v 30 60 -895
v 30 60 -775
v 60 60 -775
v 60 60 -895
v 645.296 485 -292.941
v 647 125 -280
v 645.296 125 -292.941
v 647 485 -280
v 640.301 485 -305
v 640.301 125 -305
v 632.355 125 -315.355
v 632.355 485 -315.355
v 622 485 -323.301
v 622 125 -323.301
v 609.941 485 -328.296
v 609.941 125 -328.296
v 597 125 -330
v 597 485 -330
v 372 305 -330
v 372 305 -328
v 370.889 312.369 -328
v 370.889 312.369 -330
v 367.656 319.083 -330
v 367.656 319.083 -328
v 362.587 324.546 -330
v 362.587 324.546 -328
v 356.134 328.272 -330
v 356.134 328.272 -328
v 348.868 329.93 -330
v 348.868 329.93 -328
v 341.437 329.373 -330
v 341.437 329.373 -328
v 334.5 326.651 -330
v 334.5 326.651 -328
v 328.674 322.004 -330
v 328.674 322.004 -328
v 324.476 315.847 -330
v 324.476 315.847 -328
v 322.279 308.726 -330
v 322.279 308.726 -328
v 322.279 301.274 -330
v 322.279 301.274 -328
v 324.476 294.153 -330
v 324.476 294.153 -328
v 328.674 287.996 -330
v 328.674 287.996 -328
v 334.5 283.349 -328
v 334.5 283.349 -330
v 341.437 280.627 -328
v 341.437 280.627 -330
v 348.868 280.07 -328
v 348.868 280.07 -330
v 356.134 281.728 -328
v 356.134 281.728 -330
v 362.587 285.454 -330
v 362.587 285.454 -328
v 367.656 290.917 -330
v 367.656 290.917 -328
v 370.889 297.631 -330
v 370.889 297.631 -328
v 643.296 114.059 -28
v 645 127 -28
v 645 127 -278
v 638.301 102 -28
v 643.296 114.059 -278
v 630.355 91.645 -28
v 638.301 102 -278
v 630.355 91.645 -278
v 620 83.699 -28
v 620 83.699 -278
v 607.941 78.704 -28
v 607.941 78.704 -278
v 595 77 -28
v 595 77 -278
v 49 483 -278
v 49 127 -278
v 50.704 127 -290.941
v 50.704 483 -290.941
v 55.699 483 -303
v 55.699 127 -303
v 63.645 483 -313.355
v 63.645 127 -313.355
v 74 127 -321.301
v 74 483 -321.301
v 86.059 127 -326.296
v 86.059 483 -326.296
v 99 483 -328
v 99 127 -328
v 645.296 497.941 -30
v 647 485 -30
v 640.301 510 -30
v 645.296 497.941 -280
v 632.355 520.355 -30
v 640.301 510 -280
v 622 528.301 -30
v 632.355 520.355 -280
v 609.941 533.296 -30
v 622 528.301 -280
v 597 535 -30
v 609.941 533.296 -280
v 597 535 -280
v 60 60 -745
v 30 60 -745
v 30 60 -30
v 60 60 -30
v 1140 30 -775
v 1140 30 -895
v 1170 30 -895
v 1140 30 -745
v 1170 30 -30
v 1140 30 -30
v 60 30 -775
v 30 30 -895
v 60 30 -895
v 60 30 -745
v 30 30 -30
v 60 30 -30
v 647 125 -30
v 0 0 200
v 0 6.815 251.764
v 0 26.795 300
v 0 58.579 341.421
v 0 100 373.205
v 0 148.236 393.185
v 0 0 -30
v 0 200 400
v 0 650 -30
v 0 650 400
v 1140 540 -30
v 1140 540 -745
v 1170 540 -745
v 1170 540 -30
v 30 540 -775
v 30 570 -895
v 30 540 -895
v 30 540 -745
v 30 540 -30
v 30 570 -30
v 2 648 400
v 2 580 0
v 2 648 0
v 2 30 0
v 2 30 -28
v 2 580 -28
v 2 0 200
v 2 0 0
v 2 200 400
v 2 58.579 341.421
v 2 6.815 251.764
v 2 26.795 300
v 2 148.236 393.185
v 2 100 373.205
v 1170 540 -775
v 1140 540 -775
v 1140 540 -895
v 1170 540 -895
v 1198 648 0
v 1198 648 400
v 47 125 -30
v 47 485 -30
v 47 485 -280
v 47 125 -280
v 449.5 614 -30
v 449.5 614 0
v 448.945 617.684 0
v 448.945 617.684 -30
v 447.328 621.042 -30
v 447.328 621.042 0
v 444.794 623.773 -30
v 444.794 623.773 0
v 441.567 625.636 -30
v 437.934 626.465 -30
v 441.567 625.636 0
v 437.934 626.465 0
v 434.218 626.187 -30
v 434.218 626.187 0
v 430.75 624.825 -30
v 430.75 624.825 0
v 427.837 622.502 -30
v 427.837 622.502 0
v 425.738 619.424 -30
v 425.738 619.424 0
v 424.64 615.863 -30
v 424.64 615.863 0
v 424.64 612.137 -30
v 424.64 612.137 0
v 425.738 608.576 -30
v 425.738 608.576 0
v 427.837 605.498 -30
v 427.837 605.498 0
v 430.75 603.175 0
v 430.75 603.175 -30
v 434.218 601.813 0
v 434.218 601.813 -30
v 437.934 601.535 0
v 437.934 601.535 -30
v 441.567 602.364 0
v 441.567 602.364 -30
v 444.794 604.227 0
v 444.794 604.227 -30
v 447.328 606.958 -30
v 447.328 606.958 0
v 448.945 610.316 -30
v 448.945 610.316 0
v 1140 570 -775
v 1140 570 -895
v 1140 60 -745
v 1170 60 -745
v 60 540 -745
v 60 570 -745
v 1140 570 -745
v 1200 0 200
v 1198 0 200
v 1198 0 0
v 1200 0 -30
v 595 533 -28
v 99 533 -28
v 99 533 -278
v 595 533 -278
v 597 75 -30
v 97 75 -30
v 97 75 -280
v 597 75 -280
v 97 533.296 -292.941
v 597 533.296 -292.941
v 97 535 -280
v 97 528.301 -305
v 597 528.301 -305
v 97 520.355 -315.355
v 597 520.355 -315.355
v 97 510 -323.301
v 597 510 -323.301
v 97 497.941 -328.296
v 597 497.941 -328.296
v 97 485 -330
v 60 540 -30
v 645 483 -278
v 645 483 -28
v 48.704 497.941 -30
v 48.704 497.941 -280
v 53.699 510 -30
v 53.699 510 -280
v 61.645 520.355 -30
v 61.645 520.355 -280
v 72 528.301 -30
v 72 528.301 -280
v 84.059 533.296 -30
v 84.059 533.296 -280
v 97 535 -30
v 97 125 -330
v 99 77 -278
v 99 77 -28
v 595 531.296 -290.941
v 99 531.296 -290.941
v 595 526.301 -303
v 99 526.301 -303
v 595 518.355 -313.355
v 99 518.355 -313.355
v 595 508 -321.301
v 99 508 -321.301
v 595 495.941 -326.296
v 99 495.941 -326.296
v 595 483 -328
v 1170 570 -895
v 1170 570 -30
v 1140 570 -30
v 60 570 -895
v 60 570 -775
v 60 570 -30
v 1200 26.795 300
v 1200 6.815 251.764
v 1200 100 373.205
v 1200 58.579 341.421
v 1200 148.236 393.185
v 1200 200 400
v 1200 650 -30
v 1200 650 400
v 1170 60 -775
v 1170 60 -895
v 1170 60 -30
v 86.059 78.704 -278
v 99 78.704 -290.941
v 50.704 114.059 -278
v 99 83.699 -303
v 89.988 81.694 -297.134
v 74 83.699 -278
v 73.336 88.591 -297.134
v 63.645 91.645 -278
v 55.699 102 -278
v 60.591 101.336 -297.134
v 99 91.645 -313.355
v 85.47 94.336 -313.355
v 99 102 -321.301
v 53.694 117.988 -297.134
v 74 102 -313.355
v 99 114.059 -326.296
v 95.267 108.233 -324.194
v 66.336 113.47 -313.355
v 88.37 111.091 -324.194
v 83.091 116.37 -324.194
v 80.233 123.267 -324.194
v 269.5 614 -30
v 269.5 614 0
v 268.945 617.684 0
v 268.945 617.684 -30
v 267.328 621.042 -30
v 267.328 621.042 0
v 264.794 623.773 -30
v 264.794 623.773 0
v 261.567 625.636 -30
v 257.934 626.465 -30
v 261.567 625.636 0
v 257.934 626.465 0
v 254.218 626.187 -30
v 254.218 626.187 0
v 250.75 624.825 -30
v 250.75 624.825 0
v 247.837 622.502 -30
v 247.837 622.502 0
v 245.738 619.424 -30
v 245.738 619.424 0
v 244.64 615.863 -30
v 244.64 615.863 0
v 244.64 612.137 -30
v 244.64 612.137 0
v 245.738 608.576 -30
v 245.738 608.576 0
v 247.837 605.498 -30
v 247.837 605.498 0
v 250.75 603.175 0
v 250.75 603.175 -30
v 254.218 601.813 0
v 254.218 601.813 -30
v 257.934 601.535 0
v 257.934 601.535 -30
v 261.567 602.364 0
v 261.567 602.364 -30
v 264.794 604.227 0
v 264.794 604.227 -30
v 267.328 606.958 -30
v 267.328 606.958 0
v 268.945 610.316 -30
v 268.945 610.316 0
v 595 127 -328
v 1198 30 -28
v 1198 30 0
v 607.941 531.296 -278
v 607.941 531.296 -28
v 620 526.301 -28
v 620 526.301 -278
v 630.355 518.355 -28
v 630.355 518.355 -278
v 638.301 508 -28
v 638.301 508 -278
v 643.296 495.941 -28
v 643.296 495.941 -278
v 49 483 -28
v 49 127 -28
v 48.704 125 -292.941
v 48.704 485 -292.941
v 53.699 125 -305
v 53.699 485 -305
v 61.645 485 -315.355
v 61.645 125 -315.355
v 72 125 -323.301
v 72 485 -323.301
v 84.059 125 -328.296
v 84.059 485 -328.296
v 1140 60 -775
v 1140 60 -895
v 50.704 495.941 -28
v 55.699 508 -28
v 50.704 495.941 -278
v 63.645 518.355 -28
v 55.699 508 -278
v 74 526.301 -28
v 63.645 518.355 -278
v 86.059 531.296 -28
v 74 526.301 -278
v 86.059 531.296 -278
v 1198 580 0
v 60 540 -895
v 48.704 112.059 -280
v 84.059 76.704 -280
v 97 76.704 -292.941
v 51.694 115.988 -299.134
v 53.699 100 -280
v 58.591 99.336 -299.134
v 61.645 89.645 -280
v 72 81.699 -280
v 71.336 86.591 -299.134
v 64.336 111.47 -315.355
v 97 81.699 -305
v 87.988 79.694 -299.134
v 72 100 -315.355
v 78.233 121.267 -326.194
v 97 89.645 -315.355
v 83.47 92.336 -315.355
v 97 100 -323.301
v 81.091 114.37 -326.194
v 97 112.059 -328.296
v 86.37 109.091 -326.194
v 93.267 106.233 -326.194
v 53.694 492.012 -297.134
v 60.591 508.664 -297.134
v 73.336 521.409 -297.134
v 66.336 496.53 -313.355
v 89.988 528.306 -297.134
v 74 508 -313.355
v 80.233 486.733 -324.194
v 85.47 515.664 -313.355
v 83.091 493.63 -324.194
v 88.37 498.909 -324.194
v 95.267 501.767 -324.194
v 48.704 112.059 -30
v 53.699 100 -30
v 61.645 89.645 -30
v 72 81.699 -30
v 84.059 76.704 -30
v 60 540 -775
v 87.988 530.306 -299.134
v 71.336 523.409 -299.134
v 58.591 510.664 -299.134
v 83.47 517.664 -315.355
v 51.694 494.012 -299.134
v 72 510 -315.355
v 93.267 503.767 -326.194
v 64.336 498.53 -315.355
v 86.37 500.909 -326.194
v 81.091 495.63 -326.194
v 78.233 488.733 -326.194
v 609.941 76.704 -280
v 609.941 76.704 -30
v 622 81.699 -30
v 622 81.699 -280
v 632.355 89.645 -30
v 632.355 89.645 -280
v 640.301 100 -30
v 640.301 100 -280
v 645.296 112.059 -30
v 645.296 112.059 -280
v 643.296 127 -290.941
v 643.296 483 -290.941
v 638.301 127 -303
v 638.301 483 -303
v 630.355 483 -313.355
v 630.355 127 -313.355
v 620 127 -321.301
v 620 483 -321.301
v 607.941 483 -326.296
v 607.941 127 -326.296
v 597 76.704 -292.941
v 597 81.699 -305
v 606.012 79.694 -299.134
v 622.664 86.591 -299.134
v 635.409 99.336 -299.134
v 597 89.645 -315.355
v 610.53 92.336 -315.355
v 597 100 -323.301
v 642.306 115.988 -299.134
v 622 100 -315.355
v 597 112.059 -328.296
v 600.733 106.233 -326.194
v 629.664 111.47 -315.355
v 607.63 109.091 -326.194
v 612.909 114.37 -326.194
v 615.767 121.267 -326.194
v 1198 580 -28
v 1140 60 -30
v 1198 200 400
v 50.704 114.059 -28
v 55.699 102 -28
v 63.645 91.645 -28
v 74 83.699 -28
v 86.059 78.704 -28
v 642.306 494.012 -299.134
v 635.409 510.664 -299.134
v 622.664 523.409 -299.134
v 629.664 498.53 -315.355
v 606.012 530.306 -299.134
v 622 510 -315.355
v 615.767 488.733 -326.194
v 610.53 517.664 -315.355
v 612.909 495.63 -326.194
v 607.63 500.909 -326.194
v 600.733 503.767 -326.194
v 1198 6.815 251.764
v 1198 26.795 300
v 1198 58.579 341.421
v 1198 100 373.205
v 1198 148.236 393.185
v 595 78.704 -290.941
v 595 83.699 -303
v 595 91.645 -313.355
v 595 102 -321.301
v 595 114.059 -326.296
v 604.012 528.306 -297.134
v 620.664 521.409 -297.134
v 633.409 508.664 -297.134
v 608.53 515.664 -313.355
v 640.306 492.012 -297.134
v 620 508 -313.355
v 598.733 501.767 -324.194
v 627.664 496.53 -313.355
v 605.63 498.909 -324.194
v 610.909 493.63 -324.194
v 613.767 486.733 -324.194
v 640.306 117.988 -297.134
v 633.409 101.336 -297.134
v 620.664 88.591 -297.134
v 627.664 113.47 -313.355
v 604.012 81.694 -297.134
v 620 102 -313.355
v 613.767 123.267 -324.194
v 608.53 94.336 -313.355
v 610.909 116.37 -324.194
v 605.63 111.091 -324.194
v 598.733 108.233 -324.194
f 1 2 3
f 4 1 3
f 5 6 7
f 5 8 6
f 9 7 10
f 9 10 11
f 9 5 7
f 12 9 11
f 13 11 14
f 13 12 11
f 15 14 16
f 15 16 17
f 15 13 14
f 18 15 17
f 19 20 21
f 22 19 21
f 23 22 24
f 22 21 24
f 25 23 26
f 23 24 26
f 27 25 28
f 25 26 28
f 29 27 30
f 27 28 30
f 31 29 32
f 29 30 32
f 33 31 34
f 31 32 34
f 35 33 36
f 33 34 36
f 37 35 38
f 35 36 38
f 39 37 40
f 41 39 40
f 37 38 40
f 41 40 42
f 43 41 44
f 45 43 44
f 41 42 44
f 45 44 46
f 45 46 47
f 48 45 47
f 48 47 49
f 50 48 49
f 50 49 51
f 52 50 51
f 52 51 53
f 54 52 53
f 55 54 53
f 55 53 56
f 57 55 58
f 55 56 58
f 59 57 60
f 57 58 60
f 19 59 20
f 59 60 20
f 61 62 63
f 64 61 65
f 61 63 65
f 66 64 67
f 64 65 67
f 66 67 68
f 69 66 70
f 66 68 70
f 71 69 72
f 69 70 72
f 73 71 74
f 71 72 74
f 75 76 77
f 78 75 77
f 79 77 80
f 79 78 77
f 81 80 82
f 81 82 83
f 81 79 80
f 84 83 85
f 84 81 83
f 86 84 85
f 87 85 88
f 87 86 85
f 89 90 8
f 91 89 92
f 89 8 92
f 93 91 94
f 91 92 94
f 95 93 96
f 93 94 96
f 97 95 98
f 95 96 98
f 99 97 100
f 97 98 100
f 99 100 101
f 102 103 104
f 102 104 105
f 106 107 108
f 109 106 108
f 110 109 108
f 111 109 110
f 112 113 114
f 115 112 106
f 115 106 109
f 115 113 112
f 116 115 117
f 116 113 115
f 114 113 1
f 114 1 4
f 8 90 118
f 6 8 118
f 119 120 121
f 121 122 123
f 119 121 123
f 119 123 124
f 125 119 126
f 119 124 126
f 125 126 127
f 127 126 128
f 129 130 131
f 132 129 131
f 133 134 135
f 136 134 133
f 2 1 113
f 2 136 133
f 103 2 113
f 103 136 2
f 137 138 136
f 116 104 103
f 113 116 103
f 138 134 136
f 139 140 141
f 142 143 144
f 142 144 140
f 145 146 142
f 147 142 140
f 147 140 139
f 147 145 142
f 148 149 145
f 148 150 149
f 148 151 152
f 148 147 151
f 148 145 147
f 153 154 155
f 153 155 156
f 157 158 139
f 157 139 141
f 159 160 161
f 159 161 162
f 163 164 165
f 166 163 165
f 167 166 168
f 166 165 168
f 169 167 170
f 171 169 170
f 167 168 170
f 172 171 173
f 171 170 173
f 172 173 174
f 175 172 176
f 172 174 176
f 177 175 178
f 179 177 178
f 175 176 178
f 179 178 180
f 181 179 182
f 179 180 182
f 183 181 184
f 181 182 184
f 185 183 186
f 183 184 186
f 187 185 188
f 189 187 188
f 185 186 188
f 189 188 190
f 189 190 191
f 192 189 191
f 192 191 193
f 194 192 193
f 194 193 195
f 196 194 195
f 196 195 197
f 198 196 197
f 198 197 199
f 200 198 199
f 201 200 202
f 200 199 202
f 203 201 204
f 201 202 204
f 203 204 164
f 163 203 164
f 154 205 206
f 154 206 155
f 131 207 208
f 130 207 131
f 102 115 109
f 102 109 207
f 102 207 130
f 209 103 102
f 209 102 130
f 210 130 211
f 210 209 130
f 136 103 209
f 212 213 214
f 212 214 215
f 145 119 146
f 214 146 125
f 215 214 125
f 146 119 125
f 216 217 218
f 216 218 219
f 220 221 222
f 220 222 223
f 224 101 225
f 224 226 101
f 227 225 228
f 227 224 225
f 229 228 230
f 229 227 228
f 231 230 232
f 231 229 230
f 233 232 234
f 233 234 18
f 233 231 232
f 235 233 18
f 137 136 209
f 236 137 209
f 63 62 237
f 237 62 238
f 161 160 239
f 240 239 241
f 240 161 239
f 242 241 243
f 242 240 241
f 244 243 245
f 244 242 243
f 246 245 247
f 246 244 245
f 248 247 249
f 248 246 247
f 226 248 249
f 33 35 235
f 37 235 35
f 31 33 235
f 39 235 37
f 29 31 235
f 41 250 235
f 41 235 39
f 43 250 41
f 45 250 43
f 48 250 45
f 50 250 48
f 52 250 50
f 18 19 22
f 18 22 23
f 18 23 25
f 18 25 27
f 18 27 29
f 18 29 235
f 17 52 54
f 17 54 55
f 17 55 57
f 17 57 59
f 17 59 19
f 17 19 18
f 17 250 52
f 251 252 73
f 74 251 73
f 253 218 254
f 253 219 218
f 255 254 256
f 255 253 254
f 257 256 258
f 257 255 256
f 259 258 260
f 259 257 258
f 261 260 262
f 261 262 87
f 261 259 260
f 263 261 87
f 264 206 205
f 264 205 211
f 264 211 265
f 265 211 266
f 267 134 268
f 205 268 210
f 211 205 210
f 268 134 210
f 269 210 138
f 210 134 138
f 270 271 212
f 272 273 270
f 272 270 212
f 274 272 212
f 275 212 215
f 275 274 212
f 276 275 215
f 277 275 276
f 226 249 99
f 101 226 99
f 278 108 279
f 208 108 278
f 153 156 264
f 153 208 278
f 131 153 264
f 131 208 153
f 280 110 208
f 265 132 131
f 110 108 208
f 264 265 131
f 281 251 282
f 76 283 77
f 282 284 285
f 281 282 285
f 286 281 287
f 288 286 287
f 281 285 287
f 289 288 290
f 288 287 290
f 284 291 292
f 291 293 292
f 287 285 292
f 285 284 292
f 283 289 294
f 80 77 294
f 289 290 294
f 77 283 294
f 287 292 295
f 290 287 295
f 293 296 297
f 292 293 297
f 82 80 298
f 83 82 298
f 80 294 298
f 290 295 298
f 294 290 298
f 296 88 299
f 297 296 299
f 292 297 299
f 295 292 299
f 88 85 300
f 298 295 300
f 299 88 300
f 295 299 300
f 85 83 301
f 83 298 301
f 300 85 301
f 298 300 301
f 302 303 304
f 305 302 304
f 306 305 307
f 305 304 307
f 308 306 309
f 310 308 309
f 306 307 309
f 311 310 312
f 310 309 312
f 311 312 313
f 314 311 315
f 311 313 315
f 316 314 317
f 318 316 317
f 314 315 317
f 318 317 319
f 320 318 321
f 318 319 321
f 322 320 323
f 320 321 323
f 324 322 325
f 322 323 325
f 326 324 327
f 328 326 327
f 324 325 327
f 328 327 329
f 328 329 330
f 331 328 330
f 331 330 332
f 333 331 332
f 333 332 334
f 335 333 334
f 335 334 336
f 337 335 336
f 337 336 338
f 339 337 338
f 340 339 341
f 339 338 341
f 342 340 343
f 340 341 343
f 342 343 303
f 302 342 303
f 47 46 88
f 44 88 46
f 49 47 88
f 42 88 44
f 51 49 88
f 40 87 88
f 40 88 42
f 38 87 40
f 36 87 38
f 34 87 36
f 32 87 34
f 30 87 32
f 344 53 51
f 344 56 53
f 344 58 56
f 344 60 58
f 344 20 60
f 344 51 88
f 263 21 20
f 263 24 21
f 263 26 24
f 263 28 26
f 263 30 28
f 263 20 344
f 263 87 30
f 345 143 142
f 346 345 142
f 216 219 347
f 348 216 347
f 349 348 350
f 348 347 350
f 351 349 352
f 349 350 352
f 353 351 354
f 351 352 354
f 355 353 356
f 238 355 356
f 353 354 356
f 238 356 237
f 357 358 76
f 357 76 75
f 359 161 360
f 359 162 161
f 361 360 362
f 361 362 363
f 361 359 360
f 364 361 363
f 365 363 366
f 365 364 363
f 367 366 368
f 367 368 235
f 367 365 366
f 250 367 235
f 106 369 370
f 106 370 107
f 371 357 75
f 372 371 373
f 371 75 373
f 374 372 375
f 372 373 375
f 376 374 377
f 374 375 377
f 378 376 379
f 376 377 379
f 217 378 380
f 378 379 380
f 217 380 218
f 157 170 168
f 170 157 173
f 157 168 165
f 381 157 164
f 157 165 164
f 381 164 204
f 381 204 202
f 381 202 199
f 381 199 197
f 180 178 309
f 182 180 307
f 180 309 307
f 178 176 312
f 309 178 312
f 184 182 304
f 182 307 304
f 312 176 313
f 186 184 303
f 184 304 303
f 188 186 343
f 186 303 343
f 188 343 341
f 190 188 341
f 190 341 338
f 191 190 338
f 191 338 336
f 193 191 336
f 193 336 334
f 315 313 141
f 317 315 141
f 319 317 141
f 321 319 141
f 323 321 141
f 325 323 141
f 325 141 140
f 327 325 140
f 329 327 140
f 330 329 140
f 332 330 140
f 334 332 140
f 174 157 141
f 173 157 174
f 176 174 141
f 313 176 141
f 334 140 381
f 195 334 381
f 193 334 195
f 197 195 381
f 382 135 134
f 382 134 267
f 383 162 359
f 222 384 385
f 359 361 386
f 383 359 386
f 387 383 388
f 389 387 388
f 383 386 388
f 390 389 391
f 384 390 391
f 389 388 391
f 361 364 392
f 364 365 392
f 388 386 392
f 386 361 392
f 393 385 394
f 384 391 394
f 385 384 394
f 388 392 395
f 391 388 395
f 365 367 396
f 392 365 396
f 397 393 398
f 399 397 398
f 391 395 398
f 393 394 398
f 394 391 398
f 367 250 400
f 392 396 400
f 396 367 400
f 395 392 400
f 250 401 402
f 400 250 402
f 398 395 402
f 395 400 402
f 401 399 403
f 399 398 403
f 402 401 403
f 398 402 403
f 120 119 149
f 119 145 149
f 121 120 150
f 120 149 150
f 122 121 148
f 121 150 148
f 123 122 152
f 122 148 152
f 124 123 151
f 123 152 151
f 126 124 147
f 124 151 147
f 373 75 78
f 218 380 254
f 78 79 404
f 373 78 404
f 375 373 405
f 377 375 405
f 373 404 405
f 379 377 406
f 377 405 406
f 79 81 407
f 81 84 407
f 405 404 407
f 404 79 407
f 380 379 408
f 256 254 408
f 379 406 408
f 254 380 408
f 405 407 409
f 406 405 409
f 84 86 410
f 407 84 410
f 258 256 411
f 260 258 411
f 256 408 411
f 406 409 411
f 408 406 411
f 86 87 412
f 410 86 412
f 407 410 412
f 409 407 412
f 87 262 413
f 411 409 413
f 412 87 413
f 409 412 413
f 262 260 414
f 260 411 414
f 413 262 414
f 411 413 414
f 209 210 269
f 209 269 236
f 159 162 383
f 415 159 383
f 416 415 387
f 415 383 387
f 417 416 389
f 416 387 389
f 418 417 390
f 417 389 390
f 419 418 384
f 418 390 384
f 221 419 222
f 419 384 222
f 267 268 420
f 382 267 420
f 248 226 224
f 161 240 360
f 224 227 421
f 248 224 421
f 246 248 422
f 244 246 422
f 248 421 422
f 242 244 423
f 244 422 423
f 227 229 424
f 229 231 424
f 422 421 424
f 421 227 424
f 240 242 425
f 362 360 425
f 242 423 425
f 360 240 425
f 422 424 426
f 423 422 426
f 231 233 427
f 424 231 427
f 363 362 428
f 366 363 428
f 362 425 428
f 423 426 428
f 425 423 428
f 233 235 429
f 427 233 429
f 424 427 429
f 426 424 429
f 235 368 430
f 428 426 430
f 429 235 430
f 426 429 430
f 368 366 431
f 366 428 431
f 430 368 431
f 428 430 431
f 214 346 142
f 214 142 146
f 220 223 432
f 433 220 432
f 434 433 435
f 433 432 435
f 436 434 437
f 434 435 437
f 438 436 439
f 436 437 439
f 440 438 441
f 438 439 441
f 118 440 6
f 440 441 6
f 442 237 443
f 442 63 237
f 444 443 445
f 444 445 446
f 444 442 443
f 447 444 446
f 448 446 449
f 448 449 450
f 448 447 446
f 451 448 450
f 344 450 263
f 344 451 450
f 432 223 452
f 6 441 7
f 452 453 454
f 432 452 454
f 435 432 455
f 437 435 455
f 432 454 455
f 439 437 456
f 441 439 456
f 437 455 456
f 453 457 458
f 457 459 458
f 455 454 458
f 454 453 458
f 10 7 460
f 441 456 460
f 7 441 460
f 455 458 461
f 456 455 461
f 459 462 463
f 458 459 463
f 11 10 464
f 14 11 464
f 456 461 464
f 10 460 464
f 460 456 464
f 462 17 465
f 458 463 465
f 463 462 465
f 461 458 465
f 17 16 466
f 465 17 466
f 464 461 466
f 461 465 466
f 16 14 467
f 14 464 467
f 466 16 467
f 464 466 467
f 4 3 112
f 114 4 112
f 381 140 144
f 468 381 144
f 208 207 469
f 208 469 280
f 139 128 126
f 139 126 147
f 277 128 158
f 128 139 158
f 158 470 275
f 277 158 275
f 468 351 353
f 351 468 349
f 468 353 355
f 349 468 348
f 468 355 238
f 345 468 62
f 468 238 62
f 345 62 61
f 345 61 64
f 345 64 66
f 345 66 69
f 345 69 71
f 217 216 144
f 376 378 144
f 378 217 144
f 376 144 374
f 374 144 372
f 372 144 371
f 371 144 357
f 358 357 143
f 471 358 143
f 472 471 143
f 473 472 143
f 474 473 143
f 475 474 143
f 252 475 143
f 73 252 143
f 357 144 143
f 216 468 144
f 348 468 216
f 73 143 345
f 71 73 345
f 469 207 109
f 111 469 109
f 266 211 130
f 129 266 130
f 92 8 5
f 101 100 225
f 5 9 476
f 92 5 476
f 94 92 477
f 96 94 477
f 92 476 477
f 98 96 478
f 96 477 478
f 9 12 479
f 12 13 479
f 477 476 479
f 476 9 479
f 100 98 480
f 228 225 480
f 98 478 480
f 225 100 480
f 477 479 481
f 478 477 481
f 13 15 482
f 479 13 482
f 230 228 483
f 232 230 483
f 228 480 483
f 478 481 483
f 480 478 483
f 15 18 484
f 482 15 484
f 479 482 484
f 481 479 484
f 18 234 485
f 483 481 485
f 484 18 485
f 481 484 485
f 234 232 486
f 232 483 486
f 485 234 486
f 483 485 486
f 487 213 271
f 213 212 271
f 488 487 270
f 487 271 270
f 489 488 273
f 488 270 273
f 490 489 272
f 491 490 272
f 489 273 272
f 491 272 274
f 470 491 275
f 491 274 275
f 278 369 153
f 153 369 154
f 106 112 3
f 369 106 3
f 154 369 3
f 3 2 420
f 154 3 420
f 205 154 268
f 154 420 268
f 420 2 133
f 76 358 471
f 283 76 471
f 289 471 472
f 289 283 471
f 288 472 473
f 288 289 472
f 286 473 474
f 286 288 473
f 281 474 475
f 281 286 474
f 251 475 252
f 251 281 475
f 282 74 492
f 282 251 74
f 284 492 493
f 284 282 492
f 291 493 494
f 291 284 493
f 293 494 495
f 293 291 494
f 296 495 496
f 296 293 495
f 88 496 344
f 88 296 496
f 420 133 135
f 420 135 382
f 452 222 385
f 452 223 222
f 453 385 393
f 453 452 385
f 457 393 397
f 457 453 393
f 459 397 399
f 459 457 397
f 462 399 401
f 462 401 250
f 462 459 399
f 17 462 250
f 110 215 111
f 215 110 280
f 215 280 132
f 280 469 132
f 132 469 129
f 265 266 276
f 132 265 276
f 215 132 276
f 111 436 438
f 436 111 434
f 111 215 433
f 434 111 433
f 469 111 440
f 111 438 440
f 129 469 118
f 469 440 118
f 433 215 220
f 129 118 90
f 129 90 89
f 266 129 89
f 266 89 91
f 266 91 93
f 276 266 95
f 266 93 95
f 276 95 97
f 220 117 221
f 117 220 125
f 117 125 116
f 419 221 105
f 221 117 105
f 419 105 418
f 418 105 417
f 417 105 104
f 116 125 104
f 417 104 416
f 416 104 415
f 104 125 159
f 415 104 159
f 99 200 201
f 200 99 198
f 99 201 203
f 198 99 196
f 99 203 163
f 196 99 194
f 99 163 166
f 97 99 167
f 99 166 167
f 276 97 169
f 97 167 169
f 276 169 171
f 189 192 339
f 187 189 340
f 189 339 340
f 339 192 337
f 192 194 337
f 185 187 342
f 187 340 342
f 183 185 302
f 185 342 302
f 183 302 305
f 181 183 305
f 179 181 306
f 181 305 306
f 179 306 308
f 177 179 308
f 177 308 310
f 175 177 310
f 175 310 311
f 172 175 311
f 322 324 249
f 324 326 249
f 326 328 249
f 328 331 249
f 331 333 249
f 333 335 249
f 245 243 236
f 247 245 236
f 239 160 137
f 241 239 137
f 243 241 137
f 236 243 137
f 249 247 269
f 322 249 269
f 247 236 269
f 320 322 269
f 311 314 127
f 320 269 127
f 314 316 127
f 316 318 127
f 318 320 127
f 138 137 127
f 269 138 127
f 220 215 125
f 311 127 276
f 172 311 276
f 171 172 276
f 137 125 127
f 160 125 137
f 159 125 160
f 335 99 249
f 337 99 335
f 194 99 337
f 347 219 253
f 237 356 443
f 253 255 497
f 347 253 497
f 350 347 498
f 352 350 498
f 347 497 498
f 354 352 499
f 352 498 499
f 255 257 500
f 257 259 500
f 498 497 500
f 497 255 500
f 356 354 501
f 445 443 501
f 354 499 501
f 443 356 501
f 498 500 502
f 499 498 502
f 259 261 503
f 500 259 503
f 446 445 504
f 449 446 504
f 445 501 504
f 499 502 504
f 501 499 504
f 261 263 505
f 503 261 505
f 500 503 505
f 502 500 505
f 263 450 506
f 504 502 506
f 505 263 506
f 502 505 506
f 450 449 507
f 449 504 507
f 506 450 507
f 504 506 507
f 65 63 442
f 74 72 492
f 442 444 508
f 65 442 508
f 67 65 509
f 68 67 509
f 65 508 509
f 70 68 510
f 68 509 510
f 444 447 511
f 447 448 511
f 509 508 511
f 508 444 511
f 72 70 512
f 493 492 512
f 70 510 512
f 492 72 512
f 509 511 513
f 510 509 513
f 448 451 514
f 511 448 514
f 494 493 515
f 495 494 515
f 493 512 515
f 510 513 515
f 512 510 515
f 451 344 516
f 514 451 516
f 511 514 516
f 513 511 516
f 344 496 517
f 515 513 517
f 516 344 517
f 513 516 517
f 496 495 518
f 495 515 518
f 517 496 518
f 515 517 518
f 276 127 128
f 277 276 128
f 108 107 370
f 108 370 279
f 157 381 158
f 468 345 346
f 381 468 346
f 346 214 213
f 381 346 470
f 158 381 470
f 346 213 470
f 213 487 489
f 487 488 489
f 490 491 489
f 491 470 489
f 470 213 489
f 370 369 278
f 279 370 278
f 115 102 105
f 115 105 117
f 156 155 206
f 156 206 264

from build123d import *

# Parameters (mm, degrees)
F1_DEPTH       = 1200
F2_W           = 2
F2_H           = 430
F3_DEPTH       = 648
F4_R           = 200
F5_W           = 600
F5_H           = 460
F6_DEPTH       = 300
F7_W           = 596
F7_H           = 456
F8_DEPTH       = 300
F9_R           = 50
F10_R          = 50
F11_R          = 50
F12_R          = 12.5
F13_DEPTH      = 30
F14_W          = 30
F14_H          = 30
F15_DEPTH      = 865
F16_W          = 540
F16_H          = 30
F17_DEPTH      = 1110
F17_DEPTH_BACK = 30
F18_R          = 25
F19_DEPTH      = 2


with BuildPart() as f1:
    # F0 (on Right) → F1 (new body)
    with BuildSketch(Plane.YZ):
        Polygon((30, 0), (0, 0), (0, -30), (650, -30), (650, 400), (648, 400), (648, 0), (580, 0), (580, -28), (30, -28), align=None)
    extrude(amount=F1_DEPTH)

    # F2 (on Front) → F3 (join, through all)
    with BuildSketch(Plane.XZ):
        with Locations((1, 185)):
            Rectangle(F2_W, F2_H)
        with Locations((1199, 185)):
            Rectangle(F2_W, F2_H)
    extrude(amount=-F3_DEPTH)

    # F4
    f4_edges = [f1.edges().sort_by_distance(p)[0] for p in [
        (1, 0, 400),
        (1199, 0, 400),
    ]]
    fillet(f4_edges, radius=F4_R)

    # F5 (on face) → F6 (join)
    with BuildSketch(Plane(origin=(0, 0, -30), x_dir=(1, 0, 0), z_dir=(0, 0, -1))):
        with Locations((347, -305)):
            Rectangle(F5_W, F5_H)
    extrude(amount=F6_DEPTH)

    # F7 (on face) → F8 (cut)
    with BuildSketch(Plane.XY.offset(-28)):
        with Locations((347, 305)):
            Rectangle(F7_W, F7_H)
    extrude(amount=-F8_DEPTH, mode=Mode.SUBTRACT)

    # F9
    f9_edges = [f1.edges().sort_by_distance(p)[0] for p in [
        (645, 533, -178),
        (49, 533, -178),
        (49, 77, -178),
        (645, 77, -178),
    ]]
    fillet(f9_edges, radius=F9_R)

    # F10
    f10_edges = [f1.edges().sort_by_distance(p)[0] for p in [
        (47, 535, -180),
        (47, 75, -180),
        (647, 75, -180),
        (647, 535, -180),
    ]]
    fillet(f10_edges, radius=F10_R)

    # F11
    f11_edges = [f1.edges().sort_by_distance(p)[0] for p in [
        (347, 533, -328),
        (47, 305, -330),
    ]]
    fillet(f11_edges, radius=F11_R)

    # F12 (on face) → F13 (cut, through all)
    with BuildSketch(Plane.XY):
        with Locations((257, 614)):
            Circle(F12_R)
        with Locations((437, 614)):
            Circle(F12_R)
    extrude(amount=-F13_DEPTH, mode=Mode.SUBTRACT)

    # F14 (on face) → F15 (join)
    with BuildSketch(Plane(origin=(0, 0, -30), x_dir=(1, 0, 0), z_dir=(0, 0, -1))):
        with Locations((45, -45)):
            Rectangle(F14_W, F14_H)
        with Locations((1155, -45)):
            Rectangle(F14_W, F14_H)
        with Locations((1155, -555)):
            Rectangle(F14_W, F14_H)
        with Locations((45, -555)):
            Rectangle(F14_W, F14_H)
    extrude(amount=F15_DEPTH)

    # F16 (on face) → F17 (join, two sides)
    with BuildSketch(Plane.YZ.offset(60)) as f17_sk:
        with Locations((300, -760)):
            Rectangle(F16_W, F16_H)
    extrude(amount=F17_DEPTH)
    extrude(f17_sk.sketch, amount=-F17_DEPTH_BACK)

    # F18 (on face) → F19 (cut, through all)
    with BuildSketch(Plane.XY.offset(-328)):
        with Locations((347, 305)):
            Circle(F18_R)
    extrude(amount=-F19_DEPTH, mode=Mode.SUBTRACT)


solid = f1.part
